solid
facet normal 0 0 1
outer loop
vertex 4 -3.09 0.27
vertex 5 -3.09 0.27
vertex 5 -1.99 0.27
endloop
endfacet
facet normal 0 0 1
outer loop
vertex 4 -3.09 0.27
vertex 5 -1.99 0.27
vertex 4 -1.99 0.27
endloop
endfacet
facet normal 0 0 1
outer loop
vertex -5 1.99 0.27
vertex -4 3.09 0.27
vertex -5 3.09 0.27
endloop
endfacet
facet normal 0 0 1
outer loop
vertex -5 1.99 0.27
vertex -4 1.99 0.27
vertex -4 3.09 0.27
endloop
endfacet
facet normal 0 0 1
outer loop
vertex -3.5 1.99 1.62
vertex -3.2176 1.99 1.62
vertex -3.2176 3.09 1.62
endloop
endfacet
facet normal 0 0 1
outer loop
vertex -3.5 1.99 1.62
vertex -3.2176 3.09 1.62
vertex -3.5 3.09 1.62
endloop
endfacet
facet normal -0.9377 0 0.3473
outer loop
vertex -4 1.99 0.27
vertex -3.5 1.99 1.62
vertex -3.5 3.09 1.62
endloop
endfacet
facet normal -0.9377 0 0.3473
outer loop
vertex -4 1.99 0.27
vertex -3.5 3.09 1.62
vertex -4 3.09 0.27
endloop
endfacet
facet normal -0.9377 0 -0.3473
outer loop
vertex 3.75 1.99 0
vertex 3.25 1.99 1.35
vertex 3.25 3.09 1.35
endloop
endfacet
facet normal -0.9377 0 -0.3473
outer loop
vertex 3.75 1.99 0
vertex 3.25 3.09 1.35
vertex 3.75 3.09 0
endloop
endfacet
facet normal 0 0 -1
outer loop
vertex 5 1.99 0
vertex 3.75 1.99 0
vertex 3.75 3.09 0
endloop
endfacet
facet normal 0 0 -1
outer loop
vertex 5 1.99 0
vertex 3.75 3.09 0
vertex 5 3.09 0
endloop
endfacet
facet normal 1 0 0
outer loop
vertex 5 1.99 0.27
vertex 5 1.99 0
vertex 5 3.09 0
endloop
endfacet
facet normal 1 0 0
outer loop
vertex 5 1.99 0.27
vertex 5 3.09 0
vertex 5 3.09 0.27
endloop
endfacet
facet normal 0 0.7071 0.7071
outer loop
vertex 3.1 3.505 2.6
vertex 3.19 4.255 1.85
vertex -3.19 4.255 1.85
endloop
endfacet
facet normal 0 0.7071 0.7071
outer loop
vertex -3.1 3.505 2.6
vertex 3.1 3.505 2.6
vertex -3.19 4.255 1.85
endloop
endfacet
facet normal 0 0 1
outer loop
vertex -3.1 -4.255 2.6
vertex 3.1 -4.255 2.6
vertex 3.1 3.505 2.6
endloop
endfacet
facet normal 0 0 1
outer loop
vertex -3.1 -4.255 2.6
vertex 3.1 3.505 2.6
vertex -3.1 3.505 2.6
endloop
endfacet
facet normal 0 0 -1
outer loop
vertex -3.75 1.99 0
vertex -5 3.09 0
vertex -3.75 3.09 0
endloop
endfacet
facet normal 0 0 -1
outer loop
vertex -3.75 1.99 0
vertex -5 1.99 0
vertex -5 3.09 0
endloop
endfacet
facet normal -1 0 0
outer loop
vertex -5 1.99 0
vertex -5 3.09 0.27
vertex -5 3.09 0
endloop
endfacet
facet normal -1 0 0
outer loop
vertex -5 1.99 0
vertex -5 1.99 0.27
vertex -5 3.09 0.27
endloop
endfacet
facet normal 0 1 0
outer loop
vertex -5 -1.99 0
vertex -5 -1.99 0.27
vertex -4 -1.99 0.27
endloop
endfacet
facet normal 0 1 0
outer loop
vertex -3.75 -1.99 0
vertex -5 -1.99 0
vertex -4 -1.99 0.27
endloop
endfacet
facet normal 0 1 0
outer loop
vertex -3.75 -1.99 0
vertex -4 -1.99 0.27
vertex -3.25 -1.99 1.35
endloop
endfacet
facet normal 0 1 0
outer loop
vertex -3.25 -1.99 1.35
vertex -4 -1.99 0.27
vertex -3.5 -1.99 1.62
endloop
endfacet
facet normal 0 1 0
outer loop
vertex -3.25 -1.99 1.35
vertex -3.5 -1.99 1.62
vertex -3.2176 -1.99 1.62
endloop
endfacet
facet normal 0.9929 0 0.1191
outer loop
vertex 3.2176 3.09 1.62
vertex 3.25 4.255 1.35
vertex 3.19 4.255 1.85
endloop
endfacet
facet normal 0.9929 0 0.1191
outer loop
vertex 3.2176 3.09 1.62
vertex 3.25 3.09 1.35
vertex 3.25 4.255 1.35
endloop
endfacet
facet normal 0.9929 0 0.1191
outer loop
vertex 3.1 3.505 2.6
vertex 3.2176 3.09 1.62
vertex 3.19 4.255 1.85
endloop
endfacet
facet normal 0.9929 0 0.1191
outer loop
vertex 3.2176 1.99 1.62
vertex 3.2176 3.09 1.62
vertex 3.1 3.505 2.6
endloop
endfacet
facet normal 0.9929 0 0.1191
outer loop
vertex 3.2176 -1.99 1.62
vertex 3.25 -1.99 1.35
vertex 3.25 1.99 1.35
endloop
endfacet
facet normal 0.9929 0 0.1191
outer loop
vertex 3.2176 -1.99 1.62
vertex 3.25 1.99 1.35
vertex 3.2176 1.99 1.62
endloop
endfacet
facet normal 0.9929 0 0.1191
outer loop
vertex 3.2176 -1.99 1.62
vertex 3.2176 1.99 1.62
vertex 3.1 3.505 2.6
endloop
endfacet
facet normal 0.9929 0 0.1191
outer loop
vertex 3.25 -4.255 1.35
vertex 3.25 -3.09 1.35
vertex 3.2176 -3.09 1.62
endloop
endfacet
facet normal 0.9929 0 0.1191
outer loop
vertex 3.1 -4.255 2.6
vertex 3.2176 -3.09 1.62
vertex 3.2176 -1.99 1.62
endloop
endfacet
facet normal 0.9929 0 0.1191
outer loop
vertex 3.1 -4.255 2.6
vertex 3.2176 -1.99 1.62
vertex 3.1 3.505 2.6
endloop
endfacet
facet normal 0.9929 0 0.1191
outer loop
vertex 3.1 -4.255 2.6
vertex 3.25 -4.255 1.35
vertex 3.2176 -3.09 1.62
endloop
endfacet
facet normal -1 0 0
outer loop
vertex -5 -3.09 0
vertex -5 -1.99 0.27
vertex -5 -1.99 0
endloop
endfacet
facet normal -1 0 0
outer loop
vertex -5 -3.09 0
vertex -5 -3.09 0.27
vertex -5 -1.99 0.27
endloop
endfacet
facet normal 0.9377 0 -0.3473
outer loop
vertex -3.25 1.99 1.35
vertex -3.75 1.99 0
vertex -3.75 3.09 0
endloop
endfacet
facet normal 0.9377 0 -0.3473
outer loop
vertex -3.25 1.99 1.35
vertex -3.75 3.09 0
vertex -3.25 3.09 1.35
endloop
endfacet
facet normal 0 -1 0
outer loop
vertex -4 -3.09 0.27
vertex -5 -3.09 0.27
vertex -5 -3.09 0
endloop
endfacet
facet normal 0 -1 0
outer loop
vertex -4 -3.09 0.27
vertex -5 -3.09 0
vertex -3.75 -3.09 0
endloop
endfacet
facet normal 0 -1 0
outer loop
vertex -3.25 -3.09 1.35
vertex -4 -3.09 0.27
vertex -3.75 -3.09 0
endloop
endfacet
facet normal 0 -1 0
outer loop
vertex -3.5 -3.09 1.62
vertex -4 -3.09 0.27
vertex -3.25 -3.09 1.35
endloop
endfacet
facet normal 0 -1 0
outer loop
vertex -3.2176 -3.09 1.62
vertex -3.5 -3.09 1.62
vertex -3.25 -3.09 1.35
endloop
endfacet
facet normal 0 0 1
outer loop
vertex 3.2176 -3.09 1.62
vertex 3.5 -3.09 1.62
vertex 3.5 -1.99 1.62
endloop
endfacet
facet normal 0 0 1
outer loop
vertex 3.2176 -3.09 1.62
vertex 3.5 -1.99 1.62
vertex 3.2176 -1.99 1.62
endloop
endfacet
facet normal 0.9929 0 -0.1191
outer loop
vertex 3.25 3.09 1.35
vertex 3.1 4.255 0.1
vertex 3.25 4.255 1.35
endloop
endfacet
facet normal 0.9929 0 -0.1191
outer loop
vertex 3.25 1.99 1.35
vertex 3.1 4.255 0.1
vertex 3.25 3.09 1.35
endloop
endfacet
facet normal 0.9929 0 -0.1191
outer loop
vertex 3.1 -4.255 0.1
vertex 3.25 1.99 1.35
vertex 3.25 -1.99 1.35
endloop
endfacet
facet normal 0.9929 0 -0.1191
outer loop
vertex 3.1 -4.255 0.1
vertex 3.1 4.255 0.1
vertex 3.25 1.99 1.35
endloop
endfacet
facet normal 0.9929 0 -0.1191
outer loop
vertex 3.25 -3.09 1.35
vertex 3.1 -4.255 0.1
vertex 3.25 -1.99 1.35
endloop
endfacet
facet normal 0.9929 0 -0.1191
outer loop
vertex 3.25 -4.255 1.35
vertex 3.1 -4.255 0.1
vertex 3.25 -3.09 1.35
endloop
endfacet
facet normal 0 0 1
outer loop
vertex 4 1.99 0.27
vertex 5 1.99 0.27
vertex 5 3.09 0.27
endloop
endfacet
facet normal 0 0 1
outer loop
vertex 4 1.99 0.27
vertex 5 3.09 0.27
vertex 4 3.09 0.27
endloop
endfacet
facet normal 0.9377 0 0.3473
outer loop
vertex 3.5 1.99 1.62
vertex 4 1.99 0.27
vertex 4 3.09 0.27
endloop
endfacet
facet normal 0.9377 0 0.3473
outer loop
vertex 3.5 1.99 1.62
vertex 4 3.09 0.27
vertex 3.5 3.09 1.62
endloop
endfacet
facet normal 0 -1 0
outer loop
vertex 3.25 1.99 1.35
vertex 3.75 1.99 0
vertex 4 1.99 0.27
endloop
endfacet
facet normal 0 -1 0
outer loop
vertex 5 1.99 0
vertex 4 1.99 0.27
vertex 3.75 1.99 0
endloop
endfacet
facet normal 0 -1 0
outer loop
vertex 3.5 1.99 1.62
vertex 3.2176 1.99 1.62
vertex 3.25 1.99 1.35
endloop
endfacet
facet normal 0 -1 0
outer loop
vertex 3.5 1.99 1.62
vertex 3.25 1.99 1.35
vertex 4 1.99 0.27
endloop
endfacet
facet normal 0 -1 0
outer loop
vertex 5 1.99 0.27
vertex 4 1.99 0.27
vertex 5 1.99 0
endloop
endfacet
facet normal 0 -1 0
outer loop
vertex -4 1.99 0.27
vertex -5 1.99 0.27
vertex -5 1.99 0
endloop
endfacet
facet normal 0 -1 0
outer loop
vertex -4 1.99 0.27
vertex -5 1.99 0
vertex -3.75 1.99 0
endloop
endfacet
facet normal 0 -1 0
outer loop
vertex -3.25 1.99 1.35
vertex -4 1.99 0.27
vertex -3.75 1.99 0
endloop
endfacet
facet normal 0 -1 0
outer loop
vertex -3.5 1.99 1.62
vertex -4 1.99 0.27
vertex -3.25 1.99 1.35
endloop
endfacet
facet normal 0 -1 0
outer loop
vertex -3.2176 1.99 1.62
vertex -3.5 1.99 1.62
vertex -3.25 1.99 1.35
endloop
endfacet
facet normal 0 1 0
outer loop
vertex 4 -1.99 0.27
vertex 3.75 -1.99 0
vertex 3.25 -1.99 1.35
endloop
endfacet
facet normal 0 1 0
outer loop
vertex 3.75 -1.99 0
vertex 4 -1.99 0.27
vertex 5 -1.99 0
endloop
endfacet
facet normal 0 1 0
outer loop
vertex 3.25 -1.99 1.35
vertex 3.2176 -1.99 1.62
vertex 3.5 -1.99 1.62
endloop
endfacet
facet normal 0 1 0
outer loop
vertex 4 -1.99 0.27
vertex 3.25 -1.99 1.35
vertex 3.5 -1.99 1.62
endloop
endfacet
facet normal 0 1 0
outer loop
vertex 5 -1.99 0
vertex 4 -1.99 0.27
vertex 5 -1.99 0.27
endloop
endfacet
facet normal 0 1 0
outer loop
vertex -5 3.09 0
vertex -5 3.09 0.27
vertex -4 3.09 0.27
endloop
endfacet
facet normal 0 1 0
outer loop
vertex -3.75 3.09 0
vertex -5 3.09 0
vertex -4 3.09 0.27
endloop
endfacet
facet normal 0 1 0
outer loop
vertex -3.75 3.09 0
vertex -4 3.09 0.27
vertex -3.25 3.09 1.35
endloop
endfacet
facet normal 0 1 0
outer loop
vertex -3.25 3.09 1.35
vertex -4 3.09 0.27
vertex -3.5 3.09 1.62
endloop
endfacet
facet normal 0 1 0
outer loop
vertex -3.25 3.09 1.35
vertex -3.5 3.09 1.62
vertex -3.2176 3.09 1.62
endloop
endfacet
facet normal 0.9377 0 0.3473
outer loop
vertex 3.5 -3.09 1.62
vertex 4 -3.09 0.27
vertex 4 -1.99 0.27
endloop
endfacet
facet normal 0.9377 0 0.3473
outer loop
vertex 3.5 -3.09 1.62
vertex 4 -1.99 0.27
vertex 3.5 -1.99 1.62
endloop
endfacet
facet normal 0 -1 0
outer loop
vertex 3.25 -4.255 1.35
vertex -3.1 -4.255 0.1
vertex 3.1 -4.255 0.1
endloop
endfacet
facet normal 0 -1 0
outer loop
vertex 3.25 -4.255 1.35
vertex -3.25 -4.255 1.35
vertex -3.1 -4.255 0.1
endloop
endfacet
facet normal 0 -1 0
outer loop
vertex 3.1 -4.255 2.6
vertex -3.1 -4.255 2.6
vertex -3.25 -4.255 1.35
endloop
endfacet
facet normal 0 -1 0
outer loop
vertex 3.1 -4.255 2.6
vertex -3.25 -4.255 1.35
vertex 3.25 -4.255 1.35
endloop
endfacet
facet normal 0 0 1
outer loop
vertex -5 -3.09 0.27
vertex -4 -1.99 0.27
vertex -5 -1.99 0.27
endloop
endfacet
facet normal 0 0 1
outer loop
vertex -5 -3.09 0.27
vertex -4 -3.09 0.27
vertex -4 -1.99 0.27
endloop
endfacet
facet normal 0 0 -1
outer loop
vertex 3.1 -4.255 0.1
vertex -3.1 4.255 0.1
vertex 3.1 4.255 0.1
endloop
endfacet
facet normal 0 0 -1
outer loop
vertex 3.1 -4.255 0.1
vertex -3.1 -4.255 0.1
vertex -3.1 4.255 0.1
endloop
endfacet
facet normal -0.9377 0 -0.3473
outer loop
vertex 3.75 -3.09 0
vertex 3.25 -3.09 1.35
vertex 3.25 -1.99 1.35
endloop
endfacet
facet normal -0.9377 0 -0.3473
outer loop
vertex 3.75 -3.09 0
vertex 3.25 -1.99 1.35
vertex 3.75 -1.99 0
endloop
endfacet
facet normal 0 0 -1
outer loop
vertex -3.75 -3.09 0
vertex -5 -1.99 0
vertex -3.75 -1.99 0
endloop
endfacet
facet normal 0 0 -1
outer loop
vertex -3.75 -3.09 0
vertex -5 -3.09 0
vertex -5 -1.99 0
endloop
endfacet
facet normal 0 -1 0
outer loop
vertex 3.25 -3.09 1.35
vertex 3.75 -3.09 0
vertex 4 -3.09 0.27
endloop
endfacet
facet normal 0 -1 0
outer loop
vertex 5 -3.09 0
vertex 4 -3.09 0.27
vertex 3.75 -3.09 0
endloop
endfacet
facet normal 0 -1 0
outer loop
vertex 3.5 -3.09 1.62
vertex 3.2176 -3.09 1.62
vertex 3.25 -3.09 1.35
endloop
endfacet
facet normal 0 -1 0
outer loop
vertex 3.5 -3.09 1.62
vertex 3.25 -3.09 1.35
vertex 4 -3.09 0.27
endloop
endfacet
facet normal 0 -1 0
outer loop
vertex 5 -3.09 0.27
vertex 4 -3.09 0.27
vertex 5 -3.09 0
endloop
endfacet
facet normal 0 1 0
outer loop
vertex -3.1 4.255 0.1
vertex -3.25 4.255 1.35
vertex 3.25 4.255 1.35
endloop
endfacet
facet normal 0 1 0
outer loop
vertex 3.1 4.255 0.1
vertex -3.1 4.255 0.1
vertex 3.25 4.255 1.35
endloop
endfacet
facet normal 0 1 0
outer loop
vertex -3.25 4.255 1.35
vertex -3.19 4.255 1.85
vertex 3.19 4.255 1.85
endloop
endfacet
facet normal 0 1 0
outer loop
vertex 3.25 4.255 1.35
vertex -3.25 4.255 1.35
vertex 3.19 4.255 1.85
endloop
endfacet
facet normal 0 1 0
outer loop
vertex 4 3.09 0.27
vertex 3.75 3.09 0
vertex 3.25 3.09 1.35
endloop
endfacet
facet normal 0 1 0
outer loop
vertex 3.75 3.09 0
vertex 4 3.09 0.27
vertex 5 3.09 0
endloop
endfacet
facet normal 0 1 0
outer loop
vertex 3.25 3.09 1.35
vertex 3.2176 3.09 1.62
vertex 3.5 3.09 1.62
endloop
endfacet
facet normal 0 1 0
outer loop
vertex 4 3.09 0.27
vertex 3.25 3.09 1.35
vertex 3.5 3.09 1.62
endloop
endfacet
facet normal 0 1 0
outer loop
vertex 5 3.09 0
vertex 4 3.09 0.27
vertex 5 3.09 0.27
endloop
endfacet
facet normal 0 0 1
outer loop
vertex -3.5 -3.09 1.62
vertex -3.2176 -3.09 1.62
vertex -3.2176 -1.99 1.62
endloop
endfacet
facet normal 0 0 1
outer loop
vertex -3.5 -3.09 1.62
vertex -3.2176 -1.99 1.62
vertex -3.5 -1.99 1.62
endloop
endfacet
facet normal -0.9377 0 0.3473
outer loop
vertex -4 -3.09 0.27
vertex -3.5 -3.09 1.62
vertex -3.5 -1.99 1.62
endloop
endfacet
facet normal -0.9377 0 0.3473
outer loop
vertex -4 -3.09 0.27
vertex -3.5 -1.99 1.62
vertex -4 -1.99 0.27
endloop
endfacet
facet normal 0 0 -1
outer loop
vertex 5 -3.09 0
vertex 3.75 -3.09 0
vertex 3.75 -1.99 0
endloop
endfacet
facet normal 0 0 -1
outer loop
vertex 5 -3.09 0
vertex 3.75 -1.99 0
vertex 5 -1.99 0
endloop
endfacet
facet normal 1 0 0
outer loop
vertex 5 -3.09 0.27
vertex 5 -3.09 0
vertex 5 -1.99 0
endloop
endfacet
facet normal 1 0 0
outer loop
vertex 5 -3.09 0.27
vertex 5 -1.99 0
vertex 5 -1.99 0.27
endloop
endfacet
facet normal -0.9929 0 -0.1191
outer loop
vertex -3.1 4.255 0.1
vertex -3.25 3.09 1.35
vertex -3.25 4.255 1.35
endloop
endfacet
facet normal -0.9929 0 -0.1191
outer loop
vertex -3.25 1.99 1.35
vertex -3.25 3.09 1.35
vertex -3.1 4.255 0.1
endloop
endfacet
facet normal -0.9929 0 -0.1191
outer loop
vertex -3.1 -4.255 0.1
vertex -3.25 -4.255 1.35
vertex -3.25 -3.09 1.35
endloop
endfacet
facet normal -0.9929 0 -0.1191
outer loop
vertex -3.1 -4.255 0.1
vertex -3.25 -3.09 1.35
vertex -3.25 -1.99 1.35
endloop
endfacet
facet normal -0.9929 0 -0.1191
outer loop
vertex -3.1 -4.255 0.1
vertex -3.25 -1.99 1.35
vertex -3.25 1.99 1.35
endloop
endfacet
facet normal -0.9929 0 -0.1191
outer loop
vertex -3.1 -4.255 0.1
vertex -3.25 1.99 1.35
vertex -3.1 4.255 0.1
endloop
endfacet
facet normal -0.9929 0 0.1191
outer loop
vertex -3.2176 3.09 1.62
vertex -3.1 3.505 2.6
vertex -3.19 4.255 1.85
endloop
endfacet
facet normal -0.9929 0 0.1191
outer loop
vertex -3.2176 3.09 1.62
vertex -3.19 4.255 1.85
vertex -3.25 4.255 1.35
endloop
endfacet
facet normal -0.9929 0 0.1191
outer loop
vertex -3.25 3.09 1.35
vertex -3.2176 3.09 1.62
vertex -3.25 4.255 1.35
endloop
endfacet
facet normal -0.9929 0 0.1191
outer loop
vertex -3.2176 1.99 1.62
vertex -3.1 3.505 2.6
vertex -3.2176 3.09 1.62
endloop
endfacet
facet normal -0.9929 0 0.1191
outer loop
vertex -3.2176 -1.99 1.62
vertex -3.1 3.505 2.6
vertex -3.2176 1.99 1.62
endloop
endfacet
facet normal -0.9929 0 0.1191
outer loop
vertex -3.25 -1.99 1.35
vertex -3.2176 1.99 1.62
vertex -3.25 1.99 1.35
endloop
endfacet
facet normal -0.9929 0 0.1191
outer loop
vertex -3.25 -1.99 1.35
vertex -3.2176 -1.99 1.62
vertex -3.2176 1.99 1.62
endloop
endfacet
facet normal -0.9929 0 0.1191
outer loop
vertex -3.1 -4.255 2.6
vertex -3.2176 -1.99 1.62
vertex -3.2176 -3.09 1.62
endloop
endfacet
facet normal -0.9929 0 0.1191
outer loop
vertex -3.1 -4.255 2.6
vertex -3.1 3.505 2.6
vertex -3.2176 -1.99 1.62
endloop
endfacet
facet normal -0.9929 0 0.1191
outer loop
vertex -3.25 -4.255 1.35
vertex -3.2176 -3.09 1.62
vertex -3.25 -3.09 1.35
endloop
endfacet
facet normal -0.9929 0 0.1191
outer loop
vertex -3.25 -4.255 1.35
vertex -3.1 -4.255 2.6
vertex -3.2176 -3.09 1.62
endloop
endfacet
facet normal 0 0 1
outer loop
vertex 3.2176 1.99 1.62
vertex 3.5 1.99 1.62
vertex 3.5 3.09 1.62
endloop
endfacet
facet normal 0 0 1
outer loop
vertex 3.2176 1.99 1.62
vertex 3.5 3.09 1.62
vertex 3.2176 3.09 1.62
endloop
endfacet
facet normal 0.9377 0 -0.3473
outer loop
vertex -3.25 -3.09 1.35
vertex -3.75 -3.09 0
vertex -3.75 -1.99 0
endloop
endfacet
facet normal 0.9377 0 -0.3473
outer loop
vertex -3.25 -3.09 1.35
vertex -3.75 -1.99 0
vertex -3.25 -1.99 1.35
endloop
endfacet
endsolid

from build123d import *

# Parameters (mm, degrees)
PAD001_DEPTH = 0.55
PAD002_DEPTH = 0.55
PAD_DEPTH    = 4.255
CHAMFER_SIZE = 0.75


with BuildPart() as pad001:
    # Sketch001 → Pad001 (new body, symmetric)
    with BuildSketch(Plane.XZ.offset(2.54)):
        Polygon((-5, 0), (-3.75, 0), (-3.25, 1.35), (3.25, 1.35), (3.75, 0), (5, 0), (5, 0.27), (4, 0.27), (3.5, 1.62), (-3.5, 1.62), (-4, 0.27), (-5, 0.27), align=None)
    extrude(amount=PAD001_DEPTH, both=True)


with BuildPart() as pad002:
    # Sketch002 → Pad002 (new body, symmetric)
    with BuildSketch(Plane.XZ.offset(-2.54)):
        Polygon((-5, 0), (-3.75, 0), (-3.25, 1.35), (3.25, 1.35), (3.75, 0), (5, 0), (5, 0.27), (4, 0.27), (3.5, 1.62), (-3.5, 1.62), (-4, 0.27), (-5, 0.27), align=None)
    extrude(amount=PAD002_DEPTH, both=True)


with BuildPart() as diode_bridge_vishay_dfsflat:
    # Sketch → Pad (new body, symmetric)
    with BuildSketch(Plane.XZ):
        Polygon((-3.1, 0.1), (3.1, 0.1), (3.25, 1.35), (3.1, 2.6), (-3.1, 2.6), (-3.25, 1.35), align=None)
    extrude(amount=PAD_DEPTH, both=True)

    # Chamfer
    chamfer_edges = [diode_bridge_vishay_dfsflat.edges().sort_by_distance(p)[0] for p in [
        (0, 4.255, 2.6),
    ]]
    chamfer(chamfer_edges, length=CHAMFER_SIZE)

    # Chamfer_mp_cp: union Pad001, Pad002
    add(pad001.part)
    add(pad002.part)


solid = diode_bridge_vishay_dfsflat.part
